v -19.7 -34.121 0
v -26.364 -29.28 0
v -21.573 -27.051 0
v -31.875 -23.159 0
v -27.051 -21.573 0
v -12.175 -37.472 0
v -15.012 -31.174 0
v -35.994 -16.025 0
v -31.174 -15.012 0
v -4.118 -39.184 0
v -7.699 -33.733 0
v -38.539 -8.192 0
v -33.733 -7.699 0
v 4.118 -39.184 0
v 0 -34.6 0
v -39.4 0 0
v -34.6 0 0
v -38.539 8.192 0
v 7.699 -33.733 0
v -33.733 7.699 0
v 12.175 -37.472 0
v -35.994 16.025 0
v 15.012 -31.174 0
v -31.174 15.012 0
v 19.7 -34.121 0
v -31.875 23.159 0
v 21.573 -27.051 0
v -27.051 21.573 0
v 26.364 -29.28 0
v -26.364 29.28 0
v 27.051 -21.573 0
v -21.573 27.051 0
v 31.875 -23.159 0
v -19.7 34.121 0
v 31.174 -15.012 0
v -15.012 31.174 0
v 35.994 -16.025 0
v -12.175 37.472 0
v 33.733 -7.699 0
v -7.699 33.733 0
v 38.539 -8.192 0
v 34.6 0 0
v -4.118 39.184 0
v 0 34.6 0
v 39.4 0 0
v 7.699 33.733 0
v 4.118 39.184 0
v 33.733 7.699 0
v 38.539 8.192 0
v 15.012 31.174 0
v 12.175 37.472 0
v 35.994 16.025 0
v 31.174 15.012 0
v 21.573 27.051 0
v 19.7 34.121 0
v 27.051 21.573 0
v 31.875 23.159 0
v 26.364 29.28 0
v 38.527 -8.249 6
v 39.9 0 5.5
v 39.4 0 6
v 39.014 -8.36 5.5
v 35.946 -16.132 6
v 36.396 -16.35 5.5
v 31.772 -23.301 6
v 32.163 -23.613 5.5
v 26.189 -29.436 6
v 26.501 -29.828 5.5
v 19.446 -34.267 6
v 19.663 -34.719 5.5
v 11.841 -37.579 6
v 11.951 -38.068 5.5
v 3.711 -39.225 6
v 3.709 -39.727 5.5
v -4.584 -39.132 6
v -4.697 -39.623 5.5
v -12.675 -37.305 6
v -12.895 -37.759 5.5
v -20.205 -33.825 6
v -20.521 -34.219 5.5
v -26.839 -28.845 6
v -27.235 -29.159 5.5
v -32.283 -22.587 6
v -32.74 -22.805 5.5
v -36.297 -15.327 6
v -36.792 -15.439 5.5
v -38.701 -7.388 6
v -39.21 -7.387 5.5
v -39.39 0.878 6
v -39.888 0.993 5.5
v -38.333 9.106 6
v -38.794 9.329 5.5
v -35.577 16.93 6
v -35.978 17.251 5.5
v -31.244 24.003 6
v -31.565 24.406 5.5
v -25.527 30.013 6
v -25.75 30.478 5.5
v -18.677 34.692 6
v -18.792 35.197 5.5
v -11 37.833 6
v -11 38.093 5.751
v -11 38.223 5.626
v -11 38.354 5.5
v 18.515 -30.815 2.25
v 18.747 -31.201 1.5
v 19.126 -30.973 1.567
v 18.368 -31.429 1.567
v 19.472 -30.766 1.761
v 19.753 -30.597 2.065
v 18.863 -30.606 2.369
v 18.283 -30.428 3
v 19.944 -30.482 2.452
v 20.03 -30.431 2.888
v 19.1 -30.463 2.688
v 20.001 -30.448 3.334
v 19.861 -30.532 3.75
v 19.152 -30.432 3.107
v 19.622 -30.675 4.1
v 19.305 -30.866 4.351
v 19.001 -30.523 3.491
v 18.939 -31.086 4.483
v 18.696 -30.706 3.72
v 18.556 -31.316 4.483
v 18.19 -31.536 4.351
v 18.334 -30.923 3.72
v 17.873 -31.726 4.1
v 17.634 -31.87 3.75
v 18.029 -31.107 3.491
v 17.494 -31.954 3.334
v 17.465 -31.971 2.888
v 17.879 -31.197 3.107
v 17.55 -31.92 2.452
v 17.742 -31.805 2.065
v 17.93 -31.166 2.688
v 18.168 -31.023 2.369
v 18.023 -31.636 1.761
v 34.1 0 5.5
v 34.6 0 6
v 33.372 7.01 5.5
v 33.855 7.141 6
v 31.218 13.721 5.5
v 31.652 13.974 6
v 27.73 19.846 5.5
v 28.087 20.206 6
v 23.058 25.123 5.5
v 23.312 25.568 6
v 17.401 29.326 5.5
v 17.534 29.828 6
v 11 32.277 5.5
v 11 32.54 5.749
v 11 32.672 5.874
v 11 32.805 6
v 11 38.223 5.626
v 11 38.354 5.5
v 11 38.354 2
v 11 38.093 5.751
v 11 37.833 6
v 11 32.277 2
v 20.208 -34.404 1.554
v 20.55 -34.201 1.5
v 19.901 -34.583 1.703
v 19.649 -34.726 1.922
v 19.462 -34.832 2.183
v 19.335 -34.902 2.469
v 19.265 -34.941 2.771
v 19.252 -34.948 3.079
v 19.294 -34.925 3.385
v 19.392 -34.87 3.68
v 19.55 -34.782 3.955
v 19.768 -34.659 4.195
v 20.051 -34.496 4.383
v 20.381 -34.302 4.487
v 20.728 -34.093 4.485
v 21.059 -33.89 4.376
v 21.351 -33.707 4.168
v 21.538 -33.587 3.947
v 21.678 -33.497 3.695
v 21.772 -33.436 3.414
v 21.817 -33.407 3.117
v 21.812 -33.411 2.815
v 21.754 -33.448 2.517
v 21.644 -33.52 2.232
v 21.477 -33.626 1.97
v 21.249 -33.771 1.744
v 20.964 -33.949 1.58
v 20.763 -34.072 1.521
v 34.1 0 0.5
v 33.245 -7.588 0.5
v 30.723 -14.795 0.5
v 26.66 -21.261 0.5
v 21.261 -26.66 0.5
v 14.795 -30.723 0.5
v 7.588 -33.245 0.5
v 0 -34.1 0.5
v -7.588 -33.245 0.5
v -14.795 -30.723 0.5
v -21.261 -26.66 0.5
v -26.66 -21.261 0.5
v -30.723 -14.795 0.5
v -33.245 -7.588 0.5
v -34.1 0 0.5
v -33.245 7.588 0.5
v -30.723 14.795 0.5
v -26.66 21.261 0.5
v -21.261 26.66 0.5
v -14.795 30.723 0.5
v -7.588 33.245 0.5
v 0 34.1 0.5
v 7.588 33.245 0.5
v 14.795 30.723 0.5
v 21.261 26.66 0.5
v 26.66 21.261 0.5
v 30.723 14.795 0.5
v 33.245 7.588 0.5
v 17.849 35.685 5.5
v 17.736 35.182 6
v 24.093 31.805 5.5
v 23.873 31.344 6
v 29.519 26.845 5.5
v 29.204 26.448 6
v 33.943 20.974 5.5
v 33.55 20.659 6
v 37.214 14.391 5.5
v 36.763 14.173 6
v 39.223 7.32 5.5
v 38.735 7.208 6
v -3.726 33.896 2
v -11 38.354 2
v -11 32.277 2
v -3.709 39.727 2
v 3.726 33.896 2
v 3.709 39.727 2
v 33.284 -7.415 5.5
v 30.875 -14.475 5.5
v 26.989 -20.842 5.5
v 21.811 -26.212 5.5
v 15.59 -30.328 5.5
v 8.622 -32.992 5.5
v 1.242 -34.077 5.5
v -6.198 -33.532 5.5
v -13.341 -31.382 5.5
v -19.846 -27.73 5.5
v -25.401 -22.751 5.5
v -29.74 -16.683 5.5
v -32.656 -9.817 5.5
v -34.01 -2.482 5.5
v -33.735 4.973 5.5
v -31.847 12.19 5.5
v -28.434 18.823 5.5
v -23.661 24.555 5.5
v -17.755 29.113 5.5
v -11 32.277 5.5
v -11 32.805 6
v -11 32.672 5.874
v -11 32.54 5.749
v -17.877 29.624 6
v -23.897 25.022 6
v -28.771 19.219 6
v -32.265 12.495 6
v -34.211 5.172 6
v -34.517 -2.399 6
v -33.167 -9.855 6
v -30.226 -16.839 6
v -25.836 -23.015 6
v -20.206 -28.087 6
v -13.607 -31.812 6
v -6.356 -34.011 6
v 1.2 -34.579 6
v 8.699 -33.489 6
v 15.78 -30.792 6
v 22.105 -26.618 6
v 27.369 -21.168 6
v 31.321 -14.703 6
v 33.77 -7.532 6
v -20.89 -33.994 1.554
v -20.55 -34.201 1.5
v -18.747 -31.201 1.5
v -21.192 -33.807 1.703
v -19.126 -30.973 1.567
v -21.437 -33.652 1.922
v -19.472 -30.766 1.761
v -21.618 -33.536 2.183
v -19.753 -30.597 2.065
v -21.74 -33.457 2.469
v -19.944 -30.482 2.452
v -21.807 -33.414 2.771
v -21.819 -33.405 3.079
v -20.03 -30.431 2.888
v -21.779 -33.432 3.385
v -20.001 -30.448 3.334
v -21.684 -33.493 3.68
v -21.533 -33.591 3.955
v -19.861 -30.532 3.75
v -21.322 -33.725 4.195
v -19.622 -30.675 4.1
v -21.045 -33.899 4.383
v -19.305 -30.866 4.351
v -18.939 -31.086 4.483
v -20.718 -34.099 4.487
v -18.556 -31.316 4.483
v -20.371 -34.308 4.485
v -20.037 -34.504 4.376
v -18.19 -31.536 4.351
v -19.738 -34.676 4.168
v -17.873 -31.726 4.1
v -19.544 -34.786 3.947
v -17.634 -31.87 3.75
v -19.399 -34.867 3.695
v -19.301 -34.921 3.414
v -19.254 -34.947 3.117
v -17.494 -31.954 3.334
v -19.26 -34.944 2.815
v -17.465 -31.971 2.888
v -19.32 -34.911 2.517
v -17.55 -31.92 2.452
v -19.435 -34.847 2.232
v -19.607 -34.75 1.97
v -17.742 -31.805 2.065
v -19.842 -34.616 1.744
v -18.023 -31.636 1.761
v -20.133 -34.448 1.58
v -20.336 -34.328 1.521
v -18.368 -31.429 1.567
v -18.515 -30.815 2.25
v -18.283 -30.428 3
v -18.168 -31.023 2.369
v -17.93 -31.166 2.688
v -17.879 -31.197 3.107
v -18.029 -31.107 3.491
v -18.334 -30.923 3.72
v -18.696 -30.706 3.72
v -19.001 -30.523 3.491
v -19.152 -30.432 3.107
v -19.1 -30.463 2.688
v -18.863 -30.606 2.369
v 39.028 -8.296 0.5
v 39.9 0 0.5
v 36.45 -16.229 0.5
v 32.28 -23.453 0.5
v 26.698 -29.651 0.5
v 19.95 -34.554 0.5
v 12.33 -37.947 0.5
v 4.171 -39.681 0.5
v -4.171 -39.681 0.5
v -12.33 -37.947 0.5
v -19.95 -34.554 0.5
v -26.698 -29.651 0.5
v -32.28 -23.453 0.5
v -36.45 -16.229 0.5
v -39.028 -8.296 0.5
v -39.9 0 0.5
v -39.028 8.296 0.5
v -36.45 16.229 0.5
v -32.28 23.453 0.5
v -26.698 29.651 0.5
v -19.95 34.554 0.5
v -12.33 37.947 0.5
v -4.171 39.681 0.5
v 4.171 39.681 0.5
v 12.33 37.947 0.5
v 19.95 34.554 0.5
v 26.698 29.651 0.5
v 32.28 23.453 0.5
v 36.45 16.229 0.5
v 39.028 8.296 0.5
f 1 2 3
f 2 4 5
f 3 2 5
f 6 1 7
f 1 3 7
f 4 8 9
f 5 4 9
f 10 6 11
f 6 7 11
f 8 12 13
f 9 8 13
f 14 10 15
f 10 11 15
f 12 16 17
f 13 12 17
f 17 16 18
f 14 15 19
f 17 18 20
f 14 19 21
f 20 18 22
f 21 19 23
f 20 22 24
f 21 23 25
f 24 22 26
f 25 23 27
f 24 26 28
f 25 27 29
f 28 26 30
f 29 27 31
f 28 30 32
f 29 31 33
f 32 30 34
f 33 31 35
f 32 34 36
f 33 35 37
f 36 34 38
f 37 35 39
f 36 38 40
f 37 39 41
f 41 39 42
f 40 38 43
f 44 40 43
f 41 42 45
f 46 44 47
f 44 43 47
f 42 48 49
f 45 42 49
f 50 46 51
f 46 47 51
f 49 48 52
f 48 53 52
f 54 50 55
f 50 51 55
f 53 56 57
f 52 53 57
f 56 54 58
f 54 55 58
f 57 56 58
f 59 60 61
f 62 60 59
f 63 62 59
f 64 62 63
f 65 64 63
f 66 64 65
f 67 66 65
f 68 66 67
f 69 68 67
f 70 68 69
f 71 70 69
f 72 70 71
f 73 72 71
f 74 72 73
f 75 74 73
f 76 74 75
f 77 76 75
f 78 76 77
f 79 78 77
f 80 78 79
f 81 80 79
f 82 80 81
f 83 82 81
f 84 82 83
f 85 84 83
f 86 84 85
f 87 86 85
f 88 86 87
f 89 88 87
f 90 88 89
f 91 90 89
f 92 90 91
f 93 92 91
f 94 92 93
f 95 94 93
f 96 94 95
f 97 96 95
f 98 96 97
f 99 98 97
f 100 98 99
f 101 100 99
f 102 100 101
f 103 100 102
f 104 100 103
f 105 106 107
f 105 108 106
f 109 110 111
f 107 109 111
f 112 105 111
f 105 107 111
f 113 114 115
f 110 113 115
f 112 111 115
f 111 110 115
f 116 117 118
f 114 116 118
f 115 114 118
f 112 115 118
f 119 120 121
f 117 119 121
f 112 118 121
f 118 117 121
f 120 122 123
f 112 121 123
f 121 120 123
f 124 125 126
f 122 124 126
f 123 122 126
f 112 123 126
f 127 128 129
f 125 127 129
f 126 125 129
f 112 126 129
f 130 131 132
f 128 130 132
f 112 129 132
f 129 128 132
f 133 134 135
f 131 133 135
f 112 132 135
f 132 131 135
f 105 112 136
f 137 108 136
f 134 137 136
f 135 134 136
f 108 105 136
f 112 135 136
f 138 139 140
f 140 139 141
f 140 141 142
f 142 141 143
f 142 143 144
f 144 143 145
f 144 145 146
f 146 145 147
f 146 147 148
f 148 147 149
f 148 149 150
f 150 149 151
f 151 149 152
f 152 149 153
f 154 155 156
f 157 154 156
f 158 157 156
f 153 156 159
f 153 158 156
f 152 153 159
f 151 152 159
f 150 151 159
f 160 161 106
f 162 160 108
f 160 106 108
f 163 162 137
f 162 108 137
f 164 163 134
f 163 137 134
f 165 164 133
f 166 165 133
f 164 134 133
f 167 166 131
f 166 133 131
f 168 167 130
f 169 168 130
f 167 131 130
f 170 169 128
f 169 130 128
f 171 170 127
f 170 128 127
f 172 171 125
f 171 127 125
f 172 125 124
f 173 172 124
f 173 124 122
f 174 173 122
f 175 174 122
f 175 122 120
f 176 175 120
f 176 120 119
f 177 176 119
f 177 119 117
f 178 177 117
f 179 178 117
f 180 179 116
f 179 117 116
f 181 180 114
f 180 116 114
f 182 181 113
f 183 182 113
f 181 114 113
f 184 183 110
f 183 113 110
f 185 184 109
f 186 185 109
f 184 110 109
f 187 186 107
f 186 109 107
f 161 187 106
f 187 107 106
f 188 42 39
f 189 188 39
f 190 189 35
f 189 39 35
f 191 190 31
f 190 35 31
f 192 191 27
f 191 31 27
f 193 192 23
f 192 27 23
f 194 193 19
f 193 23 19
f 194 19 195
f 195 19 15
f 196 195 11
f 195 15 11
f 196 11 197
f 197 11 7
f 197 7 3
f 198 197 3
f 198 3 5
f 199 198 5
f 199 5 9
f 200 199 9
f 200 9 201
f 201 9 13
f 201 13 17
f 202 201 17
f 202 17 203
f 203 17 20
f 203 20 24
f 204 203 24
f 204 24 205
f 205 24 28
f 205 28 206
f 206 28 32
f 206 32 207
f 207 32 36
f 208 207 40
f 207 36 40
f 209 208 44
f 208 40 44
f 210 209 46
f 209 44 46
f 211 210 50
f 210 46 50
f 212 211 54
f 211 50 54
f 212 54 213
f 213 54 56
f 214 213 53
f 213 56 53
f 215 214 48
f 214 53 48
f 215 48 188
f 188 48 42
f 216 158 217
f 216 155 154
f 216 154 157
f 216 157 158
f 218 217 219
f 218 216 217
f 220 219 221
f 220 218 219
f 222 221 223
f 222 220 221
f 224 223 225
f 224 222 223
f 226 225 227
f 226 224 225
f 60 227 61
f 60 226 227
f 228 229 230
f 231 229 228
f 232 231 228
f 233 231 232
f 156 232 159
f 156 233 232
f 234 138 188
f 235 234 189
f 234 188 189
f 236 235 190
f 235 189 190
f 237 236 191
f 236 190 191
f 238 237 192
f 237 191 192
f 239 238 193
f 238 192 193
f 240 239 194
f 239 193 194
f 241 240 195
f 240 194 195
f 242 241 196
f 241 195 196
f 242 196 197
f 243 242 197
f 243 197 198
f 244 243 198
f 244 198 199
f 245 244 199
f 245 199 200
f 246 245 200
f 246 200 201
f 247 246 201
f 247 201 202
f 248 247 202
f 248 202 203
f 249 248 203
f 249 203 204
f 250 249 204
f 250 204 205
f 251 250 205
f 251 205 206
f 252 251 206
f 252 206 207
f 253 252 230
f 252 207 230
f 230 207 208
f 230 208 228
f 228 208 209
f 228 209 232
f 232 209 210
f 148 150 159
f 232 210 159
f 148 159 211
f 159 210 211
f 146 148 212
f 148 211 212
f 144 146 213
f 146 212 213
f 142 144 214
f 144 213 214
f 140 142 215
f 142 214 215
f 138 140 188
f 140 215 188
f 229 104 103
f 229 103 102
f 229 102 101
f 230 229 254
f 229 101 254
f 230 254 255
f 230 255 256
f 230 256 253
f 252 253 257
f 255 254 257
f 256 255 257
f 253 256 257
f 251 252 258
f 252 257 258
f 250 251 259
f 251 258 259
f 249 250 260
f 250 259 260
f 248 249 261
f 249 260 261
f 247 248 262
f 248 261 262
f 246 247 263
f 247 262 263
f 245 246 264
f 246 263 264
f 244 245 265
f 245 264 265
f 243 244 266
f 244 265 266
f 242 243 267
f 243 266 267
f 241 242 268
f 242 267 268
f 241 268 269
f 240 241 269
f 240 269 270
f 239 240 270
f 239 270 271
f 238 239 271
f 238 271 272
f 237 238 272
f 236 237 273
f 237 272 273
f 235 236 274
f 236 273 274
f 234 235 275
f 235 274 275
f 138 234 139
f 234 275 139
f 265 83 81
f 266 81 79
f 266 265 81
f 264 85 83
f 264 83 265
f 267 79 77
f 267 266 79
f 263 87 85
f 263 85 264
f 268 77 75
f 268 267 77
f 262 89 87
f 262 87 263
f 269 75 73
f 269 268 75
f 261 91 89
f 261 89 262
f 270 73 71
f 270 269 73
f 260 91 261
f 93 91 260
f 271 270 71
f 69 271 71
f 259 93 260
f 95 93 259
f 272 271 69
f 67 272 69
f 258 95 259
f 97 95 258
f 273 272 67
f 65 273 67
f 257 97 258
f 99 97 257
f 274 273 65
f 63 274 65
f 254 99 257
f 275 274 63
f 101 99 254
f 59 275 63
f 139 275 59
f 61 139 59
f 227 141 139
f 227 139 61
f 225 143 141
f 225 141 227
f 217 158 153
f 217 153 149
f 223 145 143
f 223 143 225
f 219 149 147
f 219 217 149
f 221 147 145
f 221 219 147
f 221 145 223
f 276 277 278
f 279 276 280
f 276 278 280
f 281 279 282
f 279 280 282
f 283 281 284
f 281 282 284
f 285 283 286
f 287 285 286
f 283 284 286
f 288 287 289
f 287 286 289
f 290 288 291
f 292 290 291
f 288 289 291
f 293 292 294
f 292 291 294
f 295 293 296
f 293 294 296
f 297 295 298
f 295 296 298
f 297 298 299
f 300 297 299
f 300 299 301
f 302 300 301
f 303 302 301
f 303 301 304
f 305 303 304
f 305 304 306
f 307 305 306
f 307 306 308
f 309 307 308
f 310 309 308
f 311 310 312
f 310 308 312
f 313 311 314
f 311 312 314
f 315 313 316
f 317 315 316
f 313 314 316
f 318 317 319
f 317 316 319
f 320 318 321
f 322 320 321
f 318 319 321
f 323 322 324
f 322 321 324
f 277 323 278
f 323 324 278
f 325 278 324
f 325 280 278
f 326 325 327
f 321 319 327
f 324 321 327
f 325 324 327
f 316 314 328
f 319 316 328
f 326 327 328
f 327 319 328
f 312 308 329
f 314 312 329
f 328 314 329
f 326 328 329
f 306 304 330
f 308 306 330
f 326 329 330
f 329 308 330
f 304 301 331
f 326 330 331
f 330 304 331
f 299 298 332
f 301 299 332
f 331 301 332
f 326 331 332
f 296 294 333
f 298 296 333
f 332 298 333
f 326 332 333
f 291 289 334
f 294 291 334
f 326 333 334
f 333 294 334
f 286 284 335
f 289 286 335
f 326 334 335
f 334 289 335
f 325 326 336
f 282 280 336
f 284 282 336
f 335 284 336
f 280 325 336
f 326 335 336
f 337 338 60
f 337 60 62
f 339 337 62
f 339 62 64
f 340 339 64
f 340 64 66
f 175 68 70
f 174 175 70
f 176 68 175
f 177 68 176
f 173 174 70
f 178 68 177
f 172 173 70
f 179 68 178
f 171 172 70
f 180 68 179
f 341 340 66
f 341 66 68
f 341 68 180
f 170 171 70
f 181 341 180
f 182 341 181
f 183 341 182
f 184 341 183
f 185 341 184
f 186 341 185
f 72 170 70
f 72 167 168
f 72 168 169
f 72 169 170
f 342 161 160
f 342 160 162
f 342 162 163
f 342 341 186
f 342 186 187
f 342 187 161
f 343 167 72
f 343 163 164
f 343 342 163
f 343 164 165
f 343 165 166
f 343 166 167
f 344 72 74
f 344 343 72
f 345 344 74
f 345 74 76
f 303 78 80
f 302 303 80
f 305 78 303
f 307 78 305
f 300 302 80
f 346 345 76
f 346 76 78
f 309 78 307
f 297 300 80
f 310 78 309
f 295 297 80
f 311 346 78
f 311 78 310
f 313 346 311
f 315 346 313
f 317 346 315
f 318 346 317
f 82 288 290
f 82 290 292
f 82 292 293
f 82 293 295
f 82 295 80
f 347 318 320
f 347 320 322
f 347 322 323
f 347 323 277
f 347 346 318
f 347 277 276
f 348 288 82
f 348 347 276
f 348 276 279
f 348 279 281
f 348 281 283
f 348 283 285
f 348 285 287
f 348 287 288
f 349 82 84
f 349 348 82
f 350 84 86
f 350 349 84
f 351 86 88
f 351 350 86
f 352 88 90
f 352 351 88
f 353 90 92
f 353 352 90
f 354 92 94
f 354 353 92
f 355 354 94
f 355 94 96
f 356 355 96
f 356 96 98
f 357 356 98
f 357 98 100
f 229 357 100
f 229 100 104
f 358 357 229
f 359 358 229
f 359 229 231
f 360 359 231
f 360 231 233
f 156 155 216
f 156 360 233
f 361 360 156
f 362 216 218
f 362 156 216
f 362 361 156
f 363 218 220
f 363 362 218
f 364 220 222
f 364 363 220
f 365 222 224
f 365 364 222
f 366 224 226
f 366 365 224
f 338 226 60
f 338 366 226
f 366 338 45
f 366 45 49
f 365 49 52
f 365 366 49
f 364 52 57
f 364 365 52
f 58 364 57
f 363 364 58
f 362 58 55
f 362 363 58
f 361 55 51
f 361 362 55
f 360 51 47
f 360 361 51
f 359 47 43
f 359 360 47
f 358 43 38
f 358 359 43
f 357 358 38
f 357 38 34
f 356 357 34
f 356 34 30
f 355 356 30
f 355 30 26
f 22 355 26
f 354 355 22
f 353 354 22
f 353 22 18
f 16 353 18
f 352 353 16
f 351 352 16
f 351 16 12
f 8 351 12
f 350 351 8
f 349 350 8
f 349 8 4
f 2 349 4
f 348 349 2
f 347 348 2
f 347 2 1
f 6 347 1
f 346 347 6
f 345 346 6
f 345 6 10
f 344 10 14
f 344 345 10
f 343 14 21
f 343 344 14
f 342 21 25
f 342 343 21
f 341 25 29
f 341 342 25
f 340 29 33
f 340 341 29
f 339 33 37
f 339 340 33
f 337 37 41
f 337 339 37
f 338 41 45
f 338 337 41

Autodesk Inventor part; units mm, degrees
sketch "草圖1" plane through (0, 0, 0) normal (0, 0, 1) x (1, 0, 0)
  circle A0 centre (0, 0) radius 39.9
  circle A1 centre (0, 0) radius 34.1
  dimension "d0" = 79.8
  dimension "d3" = 68.2
extrude "擠出1" add sketch "草圖1" along normal blind 6
sketch "草圖2" plane through (0, 0, 6) normal (0, 0, 1) x (1, 0, 0)
  circle A0 centre (0, 0) radius 34.1 projected
  circle A1 centre (0, 0) radius 39.9 projected
  line L0 (0, 0) -> (0, 39.9)
  line L1 (11, 40.6521) -> (11, 12.8237)
  line L2 (-11, 40.6521) -> (-11, 12.8237)
  line L3 (-11, 40.6521) -> (11, 40.6521)
  line L4 (-11, 12.8237) -> (11, 12.8237)
  point P0 (11, 38.3537)
  point P1 (11, 32.2771)
  point P2 (-11, 38.3537)
  point P3 (-11, 32.2771)
  dimension "d6" = 22
extrude "擠出2" cut sketch "草圖2" against normal blind 4 contours A0 L0 A1 L1 | L2 A1 L0 A0
ref_plane "工作平面1" through (0, 0, 3) normal (0, 0, 1) x (1, 0, 0)
sketch "草圖3" plane through (0, 0, 3) normal (0, 0, 1) x (1, 0, 0)
  line L0 (0, 0) -> (0, -42.4806)
  line L1 (0, 0) -> (-20.55, -34.201)
  line L2 (0, 0) -> (20.55, -34.201)
  arc A0 (-11, 38.3537) -> (11, 38.3537) centre (0, 0) ccw projected
  line L3 (-20.55, -34.201) -> (20.55, -34.201)
  dimension "d27" = 31
ref_plane "工作平面2" through (20.55, -34.201, 3) normal (0.515, -0.8572, 0) x (0.8572, 0.515, 0)
ref_plane "工作平面3" through (-20.55, -34.201, 3) normal (-0.515, -0.8572, 0) x (0.8572, -0.515, 0)
sketch "草圖4" plane through (20.55, -34.201, 3) normal (0.515, -0.8572, 0) x (0.8572, 0.515, 0)
  point P0 (0, -3)
  point P1 (0, 0)
hole "孔1" at (20.55, -34.201, 3) direction (-0.515, 0.8572, 0) diameter 3 depth 3.5 tip angle 118
sketch "草圖5" plane through (-20.55, -34.201, 3) normal (-0.515, -0.8572, 0) x (0.8572, -0.515, 0)
  point P0 (0, -3)
  point P1 (0, 0)
hole "孔2" at (-20.55, -34.201, 3) direction (0.515, 0.8572, 0) diameter 3 depth 3.5 tip angle 118
chamfer "倒角1" distance 0.5 angle 45 6 edges at (-19.8458, -27.73, 6) (27.73, 19.8458, 6) (-34.1, 0, 0) (-24.0116, -31.8662, 6) (31.8662, 24.0116, 6) (-39.9, 0, 0)
properties part number "KE-SP-02-P1"
